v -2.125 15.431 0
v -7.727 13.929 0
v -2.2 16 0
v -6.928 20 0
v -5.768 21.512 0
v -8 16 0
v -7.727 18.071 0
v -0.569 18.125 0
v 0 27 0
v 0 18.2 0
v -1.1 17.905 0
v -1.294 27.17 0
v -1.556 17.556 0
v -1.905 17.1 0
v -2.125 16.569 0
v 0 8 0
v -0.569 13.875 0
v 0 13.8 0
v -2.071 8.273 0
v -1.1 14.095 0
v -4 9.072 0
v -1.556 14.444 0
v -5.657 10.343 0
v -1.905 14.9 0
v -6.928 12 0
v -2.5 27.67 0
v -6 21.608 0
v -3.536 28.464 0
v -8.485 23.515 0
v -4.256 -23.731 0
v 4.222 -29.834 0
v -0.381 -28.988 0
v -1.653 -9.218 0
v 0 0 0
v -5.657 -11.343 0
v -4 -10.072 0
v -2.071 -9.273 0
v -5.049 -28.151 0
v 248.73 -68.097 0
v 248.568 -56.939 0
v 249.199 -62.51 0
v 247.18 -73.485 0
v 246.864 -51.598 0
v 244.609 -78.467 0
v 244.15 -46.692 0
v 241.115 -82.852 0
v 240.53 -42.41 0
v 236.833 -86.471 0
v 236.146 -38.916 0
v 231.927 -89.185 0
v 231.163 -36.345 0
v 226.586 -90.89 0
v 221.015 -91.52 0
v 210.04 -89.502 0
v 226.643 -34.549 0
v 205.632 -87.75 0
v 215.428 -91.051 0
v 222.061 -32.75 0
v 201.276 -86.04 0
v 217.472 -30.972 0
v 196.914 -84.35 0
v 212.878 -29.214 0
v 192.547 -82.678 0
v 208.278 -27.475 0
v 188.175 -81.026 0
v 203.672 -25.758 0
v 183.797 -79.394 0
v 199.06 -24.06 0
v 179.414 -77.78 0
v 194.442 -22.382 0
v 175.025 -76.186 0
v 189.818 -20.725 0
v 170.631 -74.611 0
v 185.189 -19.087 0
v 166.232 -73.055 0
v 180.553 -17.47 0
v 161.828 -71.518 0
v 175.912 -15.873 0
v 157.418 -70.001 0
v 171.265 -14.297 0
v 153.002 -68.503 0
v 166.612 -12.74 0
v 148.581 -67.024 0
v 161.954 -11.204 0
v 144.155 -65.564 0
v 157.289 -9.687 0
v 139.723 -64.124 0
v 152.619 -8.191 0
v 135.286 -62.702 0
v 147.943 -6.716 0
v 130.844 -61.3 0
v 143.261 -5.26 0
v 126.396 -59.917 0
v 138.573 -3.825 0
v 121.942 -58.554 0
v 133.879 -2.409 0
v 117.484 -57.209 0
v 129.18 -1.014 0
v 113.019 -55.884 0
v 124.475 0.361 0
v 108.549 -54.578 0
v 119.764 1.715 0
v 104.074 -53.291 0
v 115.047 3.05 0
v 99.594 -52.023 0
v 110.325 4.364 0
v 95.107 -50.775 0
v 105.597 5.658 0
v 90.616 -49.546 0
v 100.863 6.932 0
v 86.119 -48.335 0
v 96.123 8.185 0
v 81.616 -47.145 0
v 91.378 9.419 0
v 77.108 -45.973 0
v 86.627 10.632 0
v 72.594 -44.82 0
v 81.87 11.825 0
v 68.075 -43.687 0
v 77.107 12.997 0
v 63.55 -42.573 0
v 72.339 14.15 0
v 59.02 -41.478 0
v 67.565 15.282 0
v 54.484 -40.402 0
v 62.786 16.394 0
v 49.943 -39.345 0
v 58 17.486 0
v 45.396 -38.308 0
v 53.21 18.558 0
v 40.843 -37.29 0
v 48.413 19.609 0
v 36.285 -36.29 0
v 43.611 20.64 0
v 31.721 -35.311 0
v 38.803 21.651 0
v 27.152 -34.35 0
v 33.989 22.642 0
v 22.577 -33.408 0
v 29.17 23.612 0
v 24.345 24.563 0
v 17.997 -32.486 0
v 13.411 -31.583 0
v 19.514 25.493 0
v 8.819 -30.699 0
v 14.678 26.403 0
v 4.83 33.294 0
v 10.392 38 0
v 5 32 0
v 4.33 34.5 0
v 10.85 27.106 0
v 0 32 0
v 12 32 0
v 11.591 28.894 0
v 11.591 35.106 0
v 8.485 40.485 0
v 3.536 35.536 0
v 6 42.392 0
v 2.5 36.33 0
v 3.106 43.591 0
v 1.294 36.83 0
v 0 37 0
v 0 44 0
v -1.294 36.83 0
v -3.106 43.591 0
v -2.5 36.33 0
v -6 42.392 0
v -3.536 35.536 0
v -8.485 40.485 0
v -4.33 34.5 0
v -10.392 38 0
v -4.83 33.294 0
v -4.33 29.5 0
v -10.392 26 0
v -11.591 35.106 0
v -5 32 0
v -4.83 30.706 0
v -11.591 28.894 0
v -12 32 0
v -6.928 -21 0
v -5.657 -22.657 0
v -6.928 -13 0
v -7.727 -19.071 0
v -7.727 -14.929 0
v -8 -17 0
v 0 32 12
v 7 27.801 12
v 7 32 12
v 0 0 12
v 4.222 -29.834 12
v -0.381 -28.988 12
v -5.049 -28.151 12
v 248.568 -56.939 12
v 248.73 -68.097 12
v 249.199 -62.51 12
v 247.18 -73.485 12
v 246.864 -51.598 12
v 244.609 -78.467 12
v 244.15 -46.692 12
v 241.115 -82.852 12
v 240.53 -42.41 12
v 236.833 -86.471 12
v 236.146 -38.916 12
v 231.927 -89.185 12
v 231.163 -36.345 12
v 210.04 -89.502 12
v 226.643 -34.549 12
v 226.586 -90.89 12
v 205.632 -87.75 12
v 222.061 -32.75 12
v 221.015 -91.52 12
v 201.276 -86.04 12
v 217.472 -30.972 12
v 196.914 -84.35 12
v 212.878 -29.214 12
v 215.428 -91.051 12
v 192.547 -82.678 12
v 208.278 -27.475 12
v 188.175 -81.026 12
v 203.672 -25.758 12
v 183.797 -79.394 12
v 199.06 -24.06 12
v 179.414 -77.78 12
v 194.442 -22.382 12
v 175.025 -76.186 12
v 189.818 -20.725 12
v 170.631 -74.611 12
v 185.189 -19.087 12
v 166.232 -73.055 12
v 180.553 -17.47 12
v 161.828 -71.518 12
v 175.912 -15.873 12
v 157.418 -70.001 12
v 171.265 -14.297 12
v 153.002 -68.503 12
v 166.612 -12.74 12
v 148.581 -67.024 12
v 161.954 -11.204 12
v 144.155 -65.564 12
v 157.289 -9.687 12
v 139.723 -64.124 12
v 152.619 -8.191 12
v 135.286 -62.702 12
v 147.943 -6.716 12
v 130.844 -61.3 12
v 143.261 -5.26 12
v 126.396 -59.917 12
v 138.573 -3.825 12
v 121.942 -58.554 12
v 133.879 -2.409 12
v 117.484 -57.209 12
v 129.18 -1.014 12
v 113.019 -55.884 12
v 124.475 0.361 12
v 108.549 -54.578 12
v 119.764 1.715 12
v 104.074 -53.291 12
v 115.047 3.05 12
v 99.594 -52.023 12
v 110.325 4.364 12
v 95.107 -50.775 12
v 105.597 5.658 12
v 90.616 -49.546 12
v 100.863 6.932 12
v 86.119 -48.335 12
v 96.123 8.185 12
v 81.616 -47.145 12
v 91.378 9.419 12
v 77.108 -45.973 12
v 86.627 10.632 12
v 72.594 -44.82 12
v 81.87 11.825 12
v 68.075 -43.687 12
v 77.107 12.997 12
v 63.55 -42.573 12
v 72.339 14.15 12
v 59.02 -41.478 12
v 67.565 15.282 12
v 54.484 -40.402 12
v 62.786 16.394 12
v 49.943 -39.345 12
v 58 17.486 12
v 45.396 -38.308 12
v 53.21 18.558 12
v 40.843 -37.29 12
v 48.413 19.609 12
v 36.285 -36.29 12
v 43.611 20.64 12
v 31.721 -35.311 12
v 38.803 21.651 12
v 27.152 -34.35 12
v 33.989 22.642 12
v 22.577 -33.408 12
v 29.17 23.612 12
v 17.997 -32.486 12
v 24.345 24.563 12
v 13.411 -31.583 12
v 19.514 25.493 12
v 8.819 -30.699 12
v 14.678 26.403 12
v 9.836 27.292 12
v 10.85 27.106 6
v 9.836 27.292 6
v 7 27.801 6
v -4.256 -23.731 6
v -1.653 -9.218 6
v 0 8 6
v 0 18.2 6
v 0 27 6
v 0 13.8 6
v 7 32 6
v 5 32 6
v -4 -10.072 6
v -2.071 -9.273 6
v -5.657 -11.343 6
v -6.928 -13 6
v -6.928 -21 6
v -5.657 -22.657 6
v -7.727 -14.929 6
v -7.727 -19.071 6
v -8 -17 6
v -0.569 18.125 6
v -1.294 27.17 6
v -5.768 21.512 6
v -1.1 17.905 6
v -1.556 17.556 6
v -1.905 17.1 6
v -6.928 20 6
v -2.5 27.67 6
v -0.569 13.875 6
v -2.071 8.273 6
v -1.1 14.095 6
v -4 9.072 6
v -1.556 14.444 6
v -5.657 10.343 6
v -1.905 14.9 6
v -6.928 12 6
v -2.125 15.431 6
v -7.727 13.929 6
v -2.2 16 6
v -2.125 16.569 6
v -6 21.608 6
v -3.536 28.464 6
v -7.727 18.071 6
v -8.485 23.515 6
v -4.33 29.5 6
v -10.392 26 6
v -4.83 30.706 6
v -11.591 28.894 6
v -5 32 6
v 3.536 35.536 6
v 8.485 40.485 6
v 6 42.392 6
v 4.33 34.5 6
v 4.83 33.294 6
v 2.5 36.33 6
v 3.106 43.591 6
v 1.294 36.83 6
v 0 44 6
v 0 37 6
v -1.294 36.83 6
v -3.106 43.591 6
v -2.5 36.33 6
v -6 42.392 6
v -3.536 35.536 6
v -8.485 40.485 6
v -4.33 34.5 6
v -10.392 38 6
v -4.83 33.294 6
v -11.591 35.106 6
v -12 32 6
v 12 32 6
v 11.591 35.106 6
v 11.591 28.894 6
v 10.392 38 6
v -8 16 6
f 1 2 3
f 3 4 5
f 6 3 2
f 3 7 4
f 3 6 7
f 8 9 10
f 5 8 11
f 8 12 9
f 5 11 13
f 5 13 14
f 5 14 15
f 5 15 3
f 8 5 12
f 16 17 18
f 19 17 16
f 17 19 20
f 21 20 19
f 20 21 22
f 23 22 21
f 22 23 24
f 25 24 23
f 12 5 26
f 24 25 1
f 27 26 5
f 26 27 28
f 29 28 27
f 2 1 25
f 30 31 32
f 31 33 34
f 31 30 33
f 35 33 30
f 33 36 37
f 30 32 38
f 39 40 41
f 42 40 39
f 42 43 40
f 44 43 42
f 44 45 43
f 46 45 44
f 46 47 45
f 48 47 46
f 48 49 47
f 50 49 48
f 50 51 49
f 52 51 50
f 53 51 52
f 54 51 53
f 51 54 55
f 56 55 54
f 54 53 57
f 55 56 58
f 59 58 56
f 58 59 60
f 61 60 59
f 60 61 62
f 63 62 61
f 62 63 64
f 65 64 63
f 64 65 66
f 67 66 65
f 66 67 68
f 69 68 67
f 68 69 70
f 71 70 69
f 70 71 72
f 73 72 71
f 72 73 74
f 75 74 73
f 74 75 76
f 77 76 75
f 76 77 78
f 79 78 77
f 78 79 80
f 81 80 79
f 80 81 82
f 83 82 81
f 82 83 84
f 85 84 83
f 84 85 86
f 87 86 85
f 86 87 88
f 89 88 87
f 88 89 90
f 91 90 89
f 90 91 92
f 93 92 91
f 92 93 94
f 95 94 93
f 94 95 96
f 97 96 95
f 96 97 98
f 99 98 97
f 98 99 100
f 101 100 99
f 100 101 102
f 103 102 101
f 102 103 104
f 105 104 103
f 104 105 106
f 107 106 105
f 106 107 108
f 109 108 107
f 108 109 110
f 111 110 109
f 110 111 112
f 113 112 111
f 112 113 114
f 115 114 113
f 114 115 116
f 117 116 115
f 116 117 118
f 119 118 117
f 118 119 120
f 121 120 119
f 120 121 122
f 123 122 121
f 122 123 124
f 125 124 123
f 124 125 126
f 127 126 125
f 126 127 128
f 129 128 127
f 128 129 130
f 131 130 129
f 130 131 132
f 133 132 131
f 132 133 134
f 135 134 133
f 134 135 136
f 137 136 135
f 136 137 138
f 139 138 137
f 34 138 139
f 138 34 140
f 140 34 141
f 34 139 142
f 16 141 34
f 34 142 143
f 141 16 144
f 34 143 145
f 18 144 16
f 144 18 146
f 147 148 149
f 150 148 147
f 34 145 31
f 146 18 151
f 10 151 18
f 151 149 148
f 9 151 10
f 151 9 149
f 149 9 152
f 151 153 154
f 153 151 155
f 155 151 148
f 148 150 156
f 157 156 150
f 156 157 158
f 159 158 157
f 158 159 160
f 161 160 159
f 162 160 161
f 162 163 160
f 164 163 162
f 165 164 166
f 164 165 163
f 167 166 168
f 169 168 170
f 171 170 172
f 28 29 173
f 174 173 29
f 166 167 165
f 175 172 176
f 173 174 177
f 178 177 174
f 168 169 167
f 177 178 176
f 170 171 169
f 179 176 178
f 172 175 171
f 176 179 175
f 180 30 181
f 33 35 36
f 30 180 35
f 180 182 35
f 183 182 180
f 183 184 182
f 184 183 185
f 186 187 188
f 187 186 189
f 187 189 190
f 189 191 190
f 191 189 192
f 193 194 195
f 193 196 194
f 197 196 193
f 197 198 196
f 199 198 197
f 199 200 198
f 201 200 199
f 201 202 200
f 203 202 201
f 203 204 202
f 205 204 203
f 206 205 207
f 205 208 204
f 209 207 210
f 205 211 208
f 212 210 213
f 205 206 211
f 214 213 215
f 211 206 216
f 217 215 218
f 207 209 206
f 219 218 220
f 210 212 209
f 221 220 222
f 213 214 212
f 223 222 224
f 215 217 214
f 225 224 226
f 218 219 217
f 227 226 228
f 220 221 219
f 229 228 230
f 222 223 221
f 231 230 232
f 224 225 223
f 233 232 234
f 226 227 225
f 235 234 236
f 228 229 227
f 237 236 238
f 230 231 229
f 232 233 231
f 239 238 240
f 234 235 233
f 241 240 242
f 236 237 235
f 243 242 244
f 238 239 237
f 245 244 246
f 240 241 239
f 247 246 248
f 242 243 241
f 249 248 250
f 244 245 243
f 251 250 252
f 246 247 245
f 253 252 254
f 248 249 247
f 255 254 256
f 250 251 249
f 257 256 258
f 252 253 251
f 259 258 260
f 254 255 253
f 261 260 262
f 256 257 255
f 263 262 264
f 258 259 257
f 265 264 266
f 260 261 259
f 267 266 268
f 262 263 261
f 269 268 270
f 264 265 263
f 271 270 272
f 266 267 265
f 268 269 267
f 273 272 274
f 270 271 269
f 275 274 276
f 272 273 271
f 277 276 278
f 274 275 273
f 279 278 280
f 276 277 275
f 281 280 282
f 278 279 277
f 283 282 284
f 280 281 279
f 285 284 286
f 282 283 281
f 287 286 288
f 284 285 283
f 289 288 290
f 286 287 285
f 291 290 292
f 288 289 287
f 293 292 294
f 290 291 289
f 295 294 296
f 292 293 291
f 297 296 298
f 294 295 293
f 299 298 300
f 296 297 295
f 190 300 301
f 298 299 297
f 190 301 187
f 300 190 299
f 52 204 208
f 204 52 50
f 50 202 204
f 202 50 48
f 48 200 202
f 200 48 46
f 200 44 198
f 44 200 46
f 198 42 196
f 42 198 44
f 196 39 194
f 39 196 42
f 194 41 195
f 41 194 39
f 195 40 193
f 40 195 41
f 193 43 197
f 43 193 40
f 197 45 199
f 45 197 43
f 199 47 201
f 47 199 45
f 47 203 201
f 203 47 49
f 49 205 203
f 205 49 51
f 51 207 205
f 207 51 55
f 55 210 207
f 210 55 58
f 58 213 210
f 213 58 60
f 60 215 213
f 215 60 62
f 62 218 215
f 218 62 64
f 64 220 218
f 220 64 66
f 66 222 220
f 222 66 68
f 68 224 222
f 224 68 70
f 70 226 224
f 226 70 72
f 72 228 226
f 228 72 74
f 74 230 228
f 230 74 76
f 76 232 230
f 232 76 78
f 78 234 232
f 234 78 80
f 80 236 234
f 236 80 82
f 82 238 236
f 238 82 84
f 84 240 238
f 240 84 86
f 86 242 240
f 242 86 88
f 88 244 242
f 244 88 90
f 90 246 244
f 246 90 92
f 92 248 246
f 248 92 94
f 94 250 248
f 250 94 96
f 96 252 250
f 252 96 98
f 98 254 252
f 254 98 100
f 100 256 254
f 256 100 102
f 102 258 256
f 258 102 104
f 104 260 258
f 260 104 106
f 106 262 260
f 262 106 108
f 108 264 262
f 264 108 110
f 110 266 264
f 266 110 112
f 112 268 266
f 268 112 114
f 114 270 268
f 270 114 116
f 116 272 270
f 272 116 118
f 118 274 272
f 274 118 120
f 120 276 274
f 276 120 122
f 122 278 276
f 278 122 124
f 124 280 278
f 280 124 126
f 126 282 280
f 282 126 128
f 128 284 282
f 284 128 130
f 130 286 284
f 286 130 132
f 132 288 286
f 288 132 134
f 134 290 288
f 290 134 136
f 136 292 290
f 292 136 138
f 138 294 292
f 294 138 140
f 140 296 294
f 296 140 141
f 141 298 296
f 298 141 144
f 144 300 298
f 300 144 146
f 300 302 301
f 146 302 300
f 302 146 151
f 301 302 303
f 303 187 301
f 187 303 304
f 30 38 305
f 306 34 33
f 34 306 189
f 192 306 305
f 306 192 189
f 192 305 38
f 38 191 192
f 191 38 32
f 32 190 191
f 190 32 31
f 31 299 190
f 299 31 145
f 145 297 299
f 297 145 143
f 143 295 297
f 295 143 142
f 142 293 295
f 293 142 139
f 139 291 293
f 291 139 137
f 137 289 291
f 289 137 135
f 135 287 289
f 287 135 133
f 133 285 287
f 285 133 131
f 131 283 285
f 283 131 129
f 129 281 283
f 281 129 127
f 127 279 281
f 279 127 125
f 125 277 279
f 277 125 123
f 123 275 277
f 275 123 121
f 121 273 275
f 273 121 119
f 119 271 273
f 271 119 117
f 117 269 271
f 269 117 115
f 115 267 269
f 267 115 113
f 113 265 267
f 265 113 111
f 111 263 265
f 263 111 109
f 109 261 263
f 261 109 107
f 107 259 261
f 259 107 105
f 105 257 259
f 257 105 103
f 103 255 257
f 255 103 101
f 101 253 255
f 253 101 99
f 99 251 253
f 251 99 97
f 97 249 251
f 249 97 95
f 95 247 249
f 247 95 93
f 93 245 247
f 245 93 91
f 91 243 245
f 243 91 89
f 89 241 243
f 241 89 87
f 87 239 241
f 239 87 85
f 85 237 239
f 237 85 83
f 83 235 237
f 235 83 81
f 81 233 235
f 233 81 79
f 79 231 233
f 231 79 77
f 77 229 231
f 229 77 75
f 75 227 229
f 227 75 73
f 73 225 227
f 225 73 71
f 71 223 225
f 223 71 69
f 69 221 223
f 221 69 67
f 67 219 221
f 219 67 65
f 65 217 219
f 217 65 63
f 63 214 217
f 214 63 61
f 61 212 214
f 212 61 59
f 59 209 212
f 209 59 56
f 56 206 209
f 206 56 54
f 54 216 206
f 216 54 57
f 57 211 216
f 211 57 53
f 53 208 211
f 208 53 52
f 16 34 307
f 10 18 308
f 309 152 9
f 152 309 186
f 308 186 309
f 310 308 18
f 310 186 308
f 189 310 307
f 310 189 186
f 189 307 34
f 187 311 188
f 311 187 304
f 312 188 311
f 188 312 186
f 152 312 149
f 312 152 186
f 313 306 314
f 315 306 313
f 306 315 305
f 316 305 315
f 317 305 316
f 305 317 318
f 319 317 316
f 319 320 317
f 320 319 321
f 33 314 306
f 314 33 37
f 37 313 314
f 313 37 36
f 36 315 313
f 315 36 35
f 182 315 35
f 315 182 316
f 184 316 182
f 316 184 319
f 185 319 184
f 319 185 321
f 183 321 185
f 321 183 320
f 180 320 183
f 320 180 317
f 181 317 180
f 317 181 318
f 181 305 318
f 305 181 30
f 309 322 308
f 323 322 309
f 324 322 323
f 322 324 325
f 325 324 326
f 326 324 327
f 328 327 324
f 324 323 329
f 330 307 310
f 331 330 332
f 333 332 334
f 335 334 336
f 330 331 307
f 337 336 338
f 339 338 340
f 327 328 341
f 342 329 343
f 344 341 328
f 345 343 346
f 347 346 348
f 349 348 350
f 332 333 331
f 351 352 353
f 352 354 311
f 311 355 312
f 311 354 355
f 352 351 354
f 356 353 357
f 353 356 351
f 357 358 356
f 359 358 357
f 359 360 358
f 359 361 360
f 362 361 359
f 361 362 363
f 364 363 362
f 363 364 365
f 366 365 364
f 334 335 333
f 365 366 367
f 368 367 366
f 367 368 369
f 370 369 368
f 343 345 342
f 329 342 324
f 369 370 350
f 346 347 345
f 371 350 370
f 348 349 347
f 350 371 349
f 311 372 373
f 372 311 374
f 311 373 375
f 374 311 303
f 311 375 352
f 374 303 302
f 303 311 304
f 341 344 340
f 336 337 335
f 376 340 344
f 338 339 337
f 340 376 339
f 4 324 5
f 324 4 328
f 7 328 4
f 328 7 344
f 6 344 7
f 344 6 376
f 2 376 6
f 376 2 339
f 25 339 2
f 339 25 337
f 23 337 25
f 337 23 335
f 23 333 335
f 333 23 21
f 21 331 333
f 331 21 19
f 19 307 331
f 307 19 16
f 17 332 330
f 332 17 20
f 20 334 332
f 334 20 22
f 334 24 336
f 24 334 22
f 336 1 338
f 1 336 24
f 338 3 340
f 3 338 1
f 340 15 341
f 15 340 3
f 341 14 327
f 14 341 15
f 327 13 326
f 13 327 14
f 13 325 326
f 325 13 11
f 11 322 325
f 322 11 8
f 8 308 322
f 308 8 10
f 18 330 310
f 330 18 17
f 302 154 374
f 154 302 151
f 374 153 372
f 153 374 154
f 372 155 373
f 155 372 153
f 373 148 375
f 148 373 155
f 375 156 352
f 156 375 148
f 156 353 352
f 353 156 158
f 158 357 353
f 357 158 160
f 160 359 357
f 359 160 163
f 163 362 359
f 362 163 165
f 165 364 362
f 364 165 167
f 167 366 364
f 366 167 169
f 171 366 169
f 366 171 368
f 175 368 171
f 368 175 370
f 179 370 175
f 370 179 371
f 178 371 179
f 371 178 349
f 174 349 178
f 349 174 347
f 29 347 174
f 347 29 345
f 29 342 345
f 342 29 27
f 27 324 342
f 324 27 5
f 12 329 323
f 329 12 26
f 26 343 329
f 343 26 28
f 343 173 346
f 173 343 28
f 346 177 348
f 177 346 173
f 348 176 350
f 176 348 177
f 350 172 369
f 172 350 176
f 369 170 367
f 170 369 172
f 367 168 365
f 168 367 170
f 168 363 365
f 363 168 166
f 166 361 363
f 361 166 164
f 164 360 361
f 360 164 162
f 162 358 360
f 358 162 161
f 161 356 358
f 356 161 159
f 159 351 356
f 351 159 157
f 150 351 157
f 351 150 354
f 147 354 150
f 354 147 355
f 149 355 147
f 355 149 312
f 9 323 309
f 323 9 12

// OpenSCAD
// hanger-split: half w25_8 w=25.8 cm slope=15.92 deg bow=0.59 cm r=2.86 cm depth=12.0 mm
// Print this half twice, flat. Turn the second half 180 degrees about the vertical axis, lay the
// bosses together and clamp with two M4 bolts through the 4.4 mm holes.
// Generated by hanger_split.split.scad; not rendered in this run (no OpenSCAD in the image).
depth = 12.0;
union() {
  linear_extrude(height = 12) polygon([[5.049, 28.151], [9.836, 27.292], [14.678, 26.403], [19.514, 25.493], [24.345, 24.563], [29.170, 23.612], [33.989, 22.642], [38.803, 21.651], [43.611, 20.640], [48.413, 19.609], [53.210, 18.558], [58.000, 17.486], [62.786, 16.394], [67.565, 15.282], [72.339, 14.150], [77.107, 12.997], [81.870, 11.825], [86.627, 10.632], [91.378, 9.419], [96.123, 8.185], [100.863, 6.932], [105.597, 5.658], [110.325, 4.364], [115.047, 3.050], [119.764, 1.715], [124.475, 0.361], [129.180, -1.014], [133.879, -2.409], [138.573, -3.825], [143.261, -5.260], [147.943, -6.716], [152.619, -8.191], [157.289, -9.687], [161.954, -11.204], [166.612, -12.740], [171.265, -14.297], [175.912, -15.873], [180.553, -17.470], [185.189, -19.087], [189.818, -20.725], [194.442, -22.382], [199.060, -24.060], [203.672, -25.758], [208.278, -27.475], [212.878, -29.214], [217.472, -30.972], [222.061, -32.750], [226.643, -34.549], [231.163, -36.345], [236.146, -38.916], [240.530, -42.410], [244.150, -46.692], [246.864, -51.598], [248.568, -56.939], [249.199, -62.510], [248.730, -68.097], [247.180, -73.485], [244.609, -78.467], [241.115, -82.852], [236.833, -86.471], [231.927, -89.185], [226.586, -90.890], [221.015, -91.520], [215.428, -91.051], [210.040, -89.502], [205.632, -87.750], [201.276, -86.040], [196.914, -84.350], [192.547, -82.678], [188.175, -81.026], [183.797, -79.394], [179.414, -77.780], [175.025, -76.186], [170.631, -74.611], [166.232, -73.055], [161.828, -71.518], [157.418, -70.001], [153.002, -68.503], [148.581, -67.024], [144.155, -65.564], [139.723, -64.124], [135.286, -62.702], [130.844, -61.300], [126.396, -59.917], [121.942, -58.554], [117.484, -57.209], [113.019, -55.884], [108.549, -54.578], [104.074, -53.291], [99.594, -52.023], [95.107, -50.775], [90.616, -49.546], [86.119, -48.335], [81.616, -47.145], [77.108, -45.973], [72.594, -44.820], [68.075, -43.687], [63.550, -42.573], [59.020, -41.478], [54.484, -40.402], [49.943, -39.345], [45.396, -38.308], [40.843, -37.290], [36.285, -36.290], [31.721, -35.311], [27.152, -34.350], [22.577, -33.408], [17.997, -32.486], [13.411, -31.583], [8.819, -30.699], [4.222, -29.834], [-0.381, -28.988], [-5.049, -28.151]]);
  linear_extrude(height = 12) polygon([[0.000, -28.600], [7.402, -27.625], [14.300, -24.768], [20.223, -20.223], [24.768, -14.300], [27.625, -7.402], [28.600, -0.000], [27.625, 7.402], [24.768, 14.300], [20.223, 20.223], [14.300, 24.768], [7.402, 27.625], [0.000, 28.600]]);
  linear_extrude(height = 12) polygon([[0.000, 0.000], [7.000, 0.000], [7.000, 32.000], [0.000, 32.000]]);
  linear_extrude(height = 6) difference() { polygon([[8.000, -17.000], [7.727, -14.929], [6.928, -13.000], [5.657, -11.343], [4.000, -10.072], [2.071, -9.273], [0.000, -9.000], [-2.071, -9.273], [-4.000, -10.072], [-5.657, -11.343], [-6.928, -13.000], [-7.727, -14.929], [-8.000, -17.000], [-7.727, -19.071], [-6.928, -21.000], [-5.657, -22.657], [-4.000, -23.928], [-2.071, -24.727], [-0.000, -25.000], [2.071, -24.727], [4.000, -23.928], [5.657, -22.657], [6.928, -21.000], [7.727, -19.071]]); polygon([[2.200, -17.000], [2.125, -16.431], [1.905, -15.900], [1.556, -15.444], [1.100, -15.095], [0.569, -14.875], [0.000, -14.800], [-0.569, -14.875], [-1.100, -15.095], [-1.556, -15.444], [-1.905, -15.900], [-2.125, -16.431], [-2.200, -17.000], [-2.125, -17.569], [-1.905, -18.100], [-1.556, -18.556], [-1.100, -18.905], [-0.569, -19.125], [-0.000, -19.200], [0.569, -19.125], [1.100, -18.905], [1.556, -18.556], [1.905, -18.100], [2.125, -17.569]]); }
  linear_extrude(height = 6) difference() { polygon([[8.000, 16.000], [7.727, 18.071], [6.928, 20.000], [5.657, 21.657], [4.000, 22.928], [2.071, 23.727], [0.000, 24.000], [-2.071, 23.727], [-4.000, 22.928], [-5.657, 21.657], [-6.928, 20.000], [-7.727, 18.071], [-8.000, 16.000], [-7.727, 13.929], [-6.928, 12.000], [-5.657, 10.343], [-4.000, 9.072], [-2.071, 8.273], [-0.000, 8.000], [2.071, 8.273], [4.000, 9.072], [5.657, 10.343], [6.928, 12.000], [7.727, 13.929]]); polygon([[2.200, 16.000], [2.125, 16.569], [1.905, 17.100], [1.556, 17.556], [1.100, 17.905], [0.569, 18.125], [0.000, 18.200], [-0.569, 18.125], [-1.100, 17.905], [-1.556, 17.556], [-1.905, 17.100], [-2.125, 16.569], [-2.200, 16.000], [-2.125, 15.431], [-1.905, 14.900], [-1.556, 14.444], [-1.100, 14.095], [-0.569, 13.875], [-0.000, 13.800], [0.569, 13.875], [1.100, 14.095], [1.556, 14.444], [1.905, 14.900], [2.125, 15.431]]); }
  linear_extrude(height = 6) difference() { polygon([[12.000, 32.000], [11.591, 35.106], [10.392, 38.000], [8.485, 40.485], [6.000, 42.392], [3.106, 43.591], [0.000, 44.000], [-3.106, 43.591], [-6.000, 42.392], [-8.485, 40.485], [-10.392, 38.000], [-11.591, 35.106], [-12.000, 32.000], [-11.591, 28.894], [-10.392, 26.000], [-8.485, 23.515], [-6.000, 21.608], [-3.106, 20.409], [-0.000, 20.000], [3.106, 20.409], [6.000, 21.608], [8.485, 23.515], [10.392, 26.000], [11.591, 28.894]]); polygon([[5.000, 32.000], [4.830, 33.294], [4.330, 34.500], [3.536, 35.536], [2.500, 36.330], [1.294, 36.830], [0.000, 37.000], [-1.294, 36.830], [-2.500, 36.330], [-3.536, 35.536], [-4.330, 34.500], [-4.830, 33.294], [-5.000, 32.000], [-4.830, 30.706], [-4.330, 29.500], [-3.536, 28.464], [-2.500, 27.670], [-1.294, 27.170], [-0.000, 27.000], [1.294, 27.170], [2.500, 27.670], [3.536, 28.464], [4.330, 29.500], [4.830, 30.706]]); }
}
